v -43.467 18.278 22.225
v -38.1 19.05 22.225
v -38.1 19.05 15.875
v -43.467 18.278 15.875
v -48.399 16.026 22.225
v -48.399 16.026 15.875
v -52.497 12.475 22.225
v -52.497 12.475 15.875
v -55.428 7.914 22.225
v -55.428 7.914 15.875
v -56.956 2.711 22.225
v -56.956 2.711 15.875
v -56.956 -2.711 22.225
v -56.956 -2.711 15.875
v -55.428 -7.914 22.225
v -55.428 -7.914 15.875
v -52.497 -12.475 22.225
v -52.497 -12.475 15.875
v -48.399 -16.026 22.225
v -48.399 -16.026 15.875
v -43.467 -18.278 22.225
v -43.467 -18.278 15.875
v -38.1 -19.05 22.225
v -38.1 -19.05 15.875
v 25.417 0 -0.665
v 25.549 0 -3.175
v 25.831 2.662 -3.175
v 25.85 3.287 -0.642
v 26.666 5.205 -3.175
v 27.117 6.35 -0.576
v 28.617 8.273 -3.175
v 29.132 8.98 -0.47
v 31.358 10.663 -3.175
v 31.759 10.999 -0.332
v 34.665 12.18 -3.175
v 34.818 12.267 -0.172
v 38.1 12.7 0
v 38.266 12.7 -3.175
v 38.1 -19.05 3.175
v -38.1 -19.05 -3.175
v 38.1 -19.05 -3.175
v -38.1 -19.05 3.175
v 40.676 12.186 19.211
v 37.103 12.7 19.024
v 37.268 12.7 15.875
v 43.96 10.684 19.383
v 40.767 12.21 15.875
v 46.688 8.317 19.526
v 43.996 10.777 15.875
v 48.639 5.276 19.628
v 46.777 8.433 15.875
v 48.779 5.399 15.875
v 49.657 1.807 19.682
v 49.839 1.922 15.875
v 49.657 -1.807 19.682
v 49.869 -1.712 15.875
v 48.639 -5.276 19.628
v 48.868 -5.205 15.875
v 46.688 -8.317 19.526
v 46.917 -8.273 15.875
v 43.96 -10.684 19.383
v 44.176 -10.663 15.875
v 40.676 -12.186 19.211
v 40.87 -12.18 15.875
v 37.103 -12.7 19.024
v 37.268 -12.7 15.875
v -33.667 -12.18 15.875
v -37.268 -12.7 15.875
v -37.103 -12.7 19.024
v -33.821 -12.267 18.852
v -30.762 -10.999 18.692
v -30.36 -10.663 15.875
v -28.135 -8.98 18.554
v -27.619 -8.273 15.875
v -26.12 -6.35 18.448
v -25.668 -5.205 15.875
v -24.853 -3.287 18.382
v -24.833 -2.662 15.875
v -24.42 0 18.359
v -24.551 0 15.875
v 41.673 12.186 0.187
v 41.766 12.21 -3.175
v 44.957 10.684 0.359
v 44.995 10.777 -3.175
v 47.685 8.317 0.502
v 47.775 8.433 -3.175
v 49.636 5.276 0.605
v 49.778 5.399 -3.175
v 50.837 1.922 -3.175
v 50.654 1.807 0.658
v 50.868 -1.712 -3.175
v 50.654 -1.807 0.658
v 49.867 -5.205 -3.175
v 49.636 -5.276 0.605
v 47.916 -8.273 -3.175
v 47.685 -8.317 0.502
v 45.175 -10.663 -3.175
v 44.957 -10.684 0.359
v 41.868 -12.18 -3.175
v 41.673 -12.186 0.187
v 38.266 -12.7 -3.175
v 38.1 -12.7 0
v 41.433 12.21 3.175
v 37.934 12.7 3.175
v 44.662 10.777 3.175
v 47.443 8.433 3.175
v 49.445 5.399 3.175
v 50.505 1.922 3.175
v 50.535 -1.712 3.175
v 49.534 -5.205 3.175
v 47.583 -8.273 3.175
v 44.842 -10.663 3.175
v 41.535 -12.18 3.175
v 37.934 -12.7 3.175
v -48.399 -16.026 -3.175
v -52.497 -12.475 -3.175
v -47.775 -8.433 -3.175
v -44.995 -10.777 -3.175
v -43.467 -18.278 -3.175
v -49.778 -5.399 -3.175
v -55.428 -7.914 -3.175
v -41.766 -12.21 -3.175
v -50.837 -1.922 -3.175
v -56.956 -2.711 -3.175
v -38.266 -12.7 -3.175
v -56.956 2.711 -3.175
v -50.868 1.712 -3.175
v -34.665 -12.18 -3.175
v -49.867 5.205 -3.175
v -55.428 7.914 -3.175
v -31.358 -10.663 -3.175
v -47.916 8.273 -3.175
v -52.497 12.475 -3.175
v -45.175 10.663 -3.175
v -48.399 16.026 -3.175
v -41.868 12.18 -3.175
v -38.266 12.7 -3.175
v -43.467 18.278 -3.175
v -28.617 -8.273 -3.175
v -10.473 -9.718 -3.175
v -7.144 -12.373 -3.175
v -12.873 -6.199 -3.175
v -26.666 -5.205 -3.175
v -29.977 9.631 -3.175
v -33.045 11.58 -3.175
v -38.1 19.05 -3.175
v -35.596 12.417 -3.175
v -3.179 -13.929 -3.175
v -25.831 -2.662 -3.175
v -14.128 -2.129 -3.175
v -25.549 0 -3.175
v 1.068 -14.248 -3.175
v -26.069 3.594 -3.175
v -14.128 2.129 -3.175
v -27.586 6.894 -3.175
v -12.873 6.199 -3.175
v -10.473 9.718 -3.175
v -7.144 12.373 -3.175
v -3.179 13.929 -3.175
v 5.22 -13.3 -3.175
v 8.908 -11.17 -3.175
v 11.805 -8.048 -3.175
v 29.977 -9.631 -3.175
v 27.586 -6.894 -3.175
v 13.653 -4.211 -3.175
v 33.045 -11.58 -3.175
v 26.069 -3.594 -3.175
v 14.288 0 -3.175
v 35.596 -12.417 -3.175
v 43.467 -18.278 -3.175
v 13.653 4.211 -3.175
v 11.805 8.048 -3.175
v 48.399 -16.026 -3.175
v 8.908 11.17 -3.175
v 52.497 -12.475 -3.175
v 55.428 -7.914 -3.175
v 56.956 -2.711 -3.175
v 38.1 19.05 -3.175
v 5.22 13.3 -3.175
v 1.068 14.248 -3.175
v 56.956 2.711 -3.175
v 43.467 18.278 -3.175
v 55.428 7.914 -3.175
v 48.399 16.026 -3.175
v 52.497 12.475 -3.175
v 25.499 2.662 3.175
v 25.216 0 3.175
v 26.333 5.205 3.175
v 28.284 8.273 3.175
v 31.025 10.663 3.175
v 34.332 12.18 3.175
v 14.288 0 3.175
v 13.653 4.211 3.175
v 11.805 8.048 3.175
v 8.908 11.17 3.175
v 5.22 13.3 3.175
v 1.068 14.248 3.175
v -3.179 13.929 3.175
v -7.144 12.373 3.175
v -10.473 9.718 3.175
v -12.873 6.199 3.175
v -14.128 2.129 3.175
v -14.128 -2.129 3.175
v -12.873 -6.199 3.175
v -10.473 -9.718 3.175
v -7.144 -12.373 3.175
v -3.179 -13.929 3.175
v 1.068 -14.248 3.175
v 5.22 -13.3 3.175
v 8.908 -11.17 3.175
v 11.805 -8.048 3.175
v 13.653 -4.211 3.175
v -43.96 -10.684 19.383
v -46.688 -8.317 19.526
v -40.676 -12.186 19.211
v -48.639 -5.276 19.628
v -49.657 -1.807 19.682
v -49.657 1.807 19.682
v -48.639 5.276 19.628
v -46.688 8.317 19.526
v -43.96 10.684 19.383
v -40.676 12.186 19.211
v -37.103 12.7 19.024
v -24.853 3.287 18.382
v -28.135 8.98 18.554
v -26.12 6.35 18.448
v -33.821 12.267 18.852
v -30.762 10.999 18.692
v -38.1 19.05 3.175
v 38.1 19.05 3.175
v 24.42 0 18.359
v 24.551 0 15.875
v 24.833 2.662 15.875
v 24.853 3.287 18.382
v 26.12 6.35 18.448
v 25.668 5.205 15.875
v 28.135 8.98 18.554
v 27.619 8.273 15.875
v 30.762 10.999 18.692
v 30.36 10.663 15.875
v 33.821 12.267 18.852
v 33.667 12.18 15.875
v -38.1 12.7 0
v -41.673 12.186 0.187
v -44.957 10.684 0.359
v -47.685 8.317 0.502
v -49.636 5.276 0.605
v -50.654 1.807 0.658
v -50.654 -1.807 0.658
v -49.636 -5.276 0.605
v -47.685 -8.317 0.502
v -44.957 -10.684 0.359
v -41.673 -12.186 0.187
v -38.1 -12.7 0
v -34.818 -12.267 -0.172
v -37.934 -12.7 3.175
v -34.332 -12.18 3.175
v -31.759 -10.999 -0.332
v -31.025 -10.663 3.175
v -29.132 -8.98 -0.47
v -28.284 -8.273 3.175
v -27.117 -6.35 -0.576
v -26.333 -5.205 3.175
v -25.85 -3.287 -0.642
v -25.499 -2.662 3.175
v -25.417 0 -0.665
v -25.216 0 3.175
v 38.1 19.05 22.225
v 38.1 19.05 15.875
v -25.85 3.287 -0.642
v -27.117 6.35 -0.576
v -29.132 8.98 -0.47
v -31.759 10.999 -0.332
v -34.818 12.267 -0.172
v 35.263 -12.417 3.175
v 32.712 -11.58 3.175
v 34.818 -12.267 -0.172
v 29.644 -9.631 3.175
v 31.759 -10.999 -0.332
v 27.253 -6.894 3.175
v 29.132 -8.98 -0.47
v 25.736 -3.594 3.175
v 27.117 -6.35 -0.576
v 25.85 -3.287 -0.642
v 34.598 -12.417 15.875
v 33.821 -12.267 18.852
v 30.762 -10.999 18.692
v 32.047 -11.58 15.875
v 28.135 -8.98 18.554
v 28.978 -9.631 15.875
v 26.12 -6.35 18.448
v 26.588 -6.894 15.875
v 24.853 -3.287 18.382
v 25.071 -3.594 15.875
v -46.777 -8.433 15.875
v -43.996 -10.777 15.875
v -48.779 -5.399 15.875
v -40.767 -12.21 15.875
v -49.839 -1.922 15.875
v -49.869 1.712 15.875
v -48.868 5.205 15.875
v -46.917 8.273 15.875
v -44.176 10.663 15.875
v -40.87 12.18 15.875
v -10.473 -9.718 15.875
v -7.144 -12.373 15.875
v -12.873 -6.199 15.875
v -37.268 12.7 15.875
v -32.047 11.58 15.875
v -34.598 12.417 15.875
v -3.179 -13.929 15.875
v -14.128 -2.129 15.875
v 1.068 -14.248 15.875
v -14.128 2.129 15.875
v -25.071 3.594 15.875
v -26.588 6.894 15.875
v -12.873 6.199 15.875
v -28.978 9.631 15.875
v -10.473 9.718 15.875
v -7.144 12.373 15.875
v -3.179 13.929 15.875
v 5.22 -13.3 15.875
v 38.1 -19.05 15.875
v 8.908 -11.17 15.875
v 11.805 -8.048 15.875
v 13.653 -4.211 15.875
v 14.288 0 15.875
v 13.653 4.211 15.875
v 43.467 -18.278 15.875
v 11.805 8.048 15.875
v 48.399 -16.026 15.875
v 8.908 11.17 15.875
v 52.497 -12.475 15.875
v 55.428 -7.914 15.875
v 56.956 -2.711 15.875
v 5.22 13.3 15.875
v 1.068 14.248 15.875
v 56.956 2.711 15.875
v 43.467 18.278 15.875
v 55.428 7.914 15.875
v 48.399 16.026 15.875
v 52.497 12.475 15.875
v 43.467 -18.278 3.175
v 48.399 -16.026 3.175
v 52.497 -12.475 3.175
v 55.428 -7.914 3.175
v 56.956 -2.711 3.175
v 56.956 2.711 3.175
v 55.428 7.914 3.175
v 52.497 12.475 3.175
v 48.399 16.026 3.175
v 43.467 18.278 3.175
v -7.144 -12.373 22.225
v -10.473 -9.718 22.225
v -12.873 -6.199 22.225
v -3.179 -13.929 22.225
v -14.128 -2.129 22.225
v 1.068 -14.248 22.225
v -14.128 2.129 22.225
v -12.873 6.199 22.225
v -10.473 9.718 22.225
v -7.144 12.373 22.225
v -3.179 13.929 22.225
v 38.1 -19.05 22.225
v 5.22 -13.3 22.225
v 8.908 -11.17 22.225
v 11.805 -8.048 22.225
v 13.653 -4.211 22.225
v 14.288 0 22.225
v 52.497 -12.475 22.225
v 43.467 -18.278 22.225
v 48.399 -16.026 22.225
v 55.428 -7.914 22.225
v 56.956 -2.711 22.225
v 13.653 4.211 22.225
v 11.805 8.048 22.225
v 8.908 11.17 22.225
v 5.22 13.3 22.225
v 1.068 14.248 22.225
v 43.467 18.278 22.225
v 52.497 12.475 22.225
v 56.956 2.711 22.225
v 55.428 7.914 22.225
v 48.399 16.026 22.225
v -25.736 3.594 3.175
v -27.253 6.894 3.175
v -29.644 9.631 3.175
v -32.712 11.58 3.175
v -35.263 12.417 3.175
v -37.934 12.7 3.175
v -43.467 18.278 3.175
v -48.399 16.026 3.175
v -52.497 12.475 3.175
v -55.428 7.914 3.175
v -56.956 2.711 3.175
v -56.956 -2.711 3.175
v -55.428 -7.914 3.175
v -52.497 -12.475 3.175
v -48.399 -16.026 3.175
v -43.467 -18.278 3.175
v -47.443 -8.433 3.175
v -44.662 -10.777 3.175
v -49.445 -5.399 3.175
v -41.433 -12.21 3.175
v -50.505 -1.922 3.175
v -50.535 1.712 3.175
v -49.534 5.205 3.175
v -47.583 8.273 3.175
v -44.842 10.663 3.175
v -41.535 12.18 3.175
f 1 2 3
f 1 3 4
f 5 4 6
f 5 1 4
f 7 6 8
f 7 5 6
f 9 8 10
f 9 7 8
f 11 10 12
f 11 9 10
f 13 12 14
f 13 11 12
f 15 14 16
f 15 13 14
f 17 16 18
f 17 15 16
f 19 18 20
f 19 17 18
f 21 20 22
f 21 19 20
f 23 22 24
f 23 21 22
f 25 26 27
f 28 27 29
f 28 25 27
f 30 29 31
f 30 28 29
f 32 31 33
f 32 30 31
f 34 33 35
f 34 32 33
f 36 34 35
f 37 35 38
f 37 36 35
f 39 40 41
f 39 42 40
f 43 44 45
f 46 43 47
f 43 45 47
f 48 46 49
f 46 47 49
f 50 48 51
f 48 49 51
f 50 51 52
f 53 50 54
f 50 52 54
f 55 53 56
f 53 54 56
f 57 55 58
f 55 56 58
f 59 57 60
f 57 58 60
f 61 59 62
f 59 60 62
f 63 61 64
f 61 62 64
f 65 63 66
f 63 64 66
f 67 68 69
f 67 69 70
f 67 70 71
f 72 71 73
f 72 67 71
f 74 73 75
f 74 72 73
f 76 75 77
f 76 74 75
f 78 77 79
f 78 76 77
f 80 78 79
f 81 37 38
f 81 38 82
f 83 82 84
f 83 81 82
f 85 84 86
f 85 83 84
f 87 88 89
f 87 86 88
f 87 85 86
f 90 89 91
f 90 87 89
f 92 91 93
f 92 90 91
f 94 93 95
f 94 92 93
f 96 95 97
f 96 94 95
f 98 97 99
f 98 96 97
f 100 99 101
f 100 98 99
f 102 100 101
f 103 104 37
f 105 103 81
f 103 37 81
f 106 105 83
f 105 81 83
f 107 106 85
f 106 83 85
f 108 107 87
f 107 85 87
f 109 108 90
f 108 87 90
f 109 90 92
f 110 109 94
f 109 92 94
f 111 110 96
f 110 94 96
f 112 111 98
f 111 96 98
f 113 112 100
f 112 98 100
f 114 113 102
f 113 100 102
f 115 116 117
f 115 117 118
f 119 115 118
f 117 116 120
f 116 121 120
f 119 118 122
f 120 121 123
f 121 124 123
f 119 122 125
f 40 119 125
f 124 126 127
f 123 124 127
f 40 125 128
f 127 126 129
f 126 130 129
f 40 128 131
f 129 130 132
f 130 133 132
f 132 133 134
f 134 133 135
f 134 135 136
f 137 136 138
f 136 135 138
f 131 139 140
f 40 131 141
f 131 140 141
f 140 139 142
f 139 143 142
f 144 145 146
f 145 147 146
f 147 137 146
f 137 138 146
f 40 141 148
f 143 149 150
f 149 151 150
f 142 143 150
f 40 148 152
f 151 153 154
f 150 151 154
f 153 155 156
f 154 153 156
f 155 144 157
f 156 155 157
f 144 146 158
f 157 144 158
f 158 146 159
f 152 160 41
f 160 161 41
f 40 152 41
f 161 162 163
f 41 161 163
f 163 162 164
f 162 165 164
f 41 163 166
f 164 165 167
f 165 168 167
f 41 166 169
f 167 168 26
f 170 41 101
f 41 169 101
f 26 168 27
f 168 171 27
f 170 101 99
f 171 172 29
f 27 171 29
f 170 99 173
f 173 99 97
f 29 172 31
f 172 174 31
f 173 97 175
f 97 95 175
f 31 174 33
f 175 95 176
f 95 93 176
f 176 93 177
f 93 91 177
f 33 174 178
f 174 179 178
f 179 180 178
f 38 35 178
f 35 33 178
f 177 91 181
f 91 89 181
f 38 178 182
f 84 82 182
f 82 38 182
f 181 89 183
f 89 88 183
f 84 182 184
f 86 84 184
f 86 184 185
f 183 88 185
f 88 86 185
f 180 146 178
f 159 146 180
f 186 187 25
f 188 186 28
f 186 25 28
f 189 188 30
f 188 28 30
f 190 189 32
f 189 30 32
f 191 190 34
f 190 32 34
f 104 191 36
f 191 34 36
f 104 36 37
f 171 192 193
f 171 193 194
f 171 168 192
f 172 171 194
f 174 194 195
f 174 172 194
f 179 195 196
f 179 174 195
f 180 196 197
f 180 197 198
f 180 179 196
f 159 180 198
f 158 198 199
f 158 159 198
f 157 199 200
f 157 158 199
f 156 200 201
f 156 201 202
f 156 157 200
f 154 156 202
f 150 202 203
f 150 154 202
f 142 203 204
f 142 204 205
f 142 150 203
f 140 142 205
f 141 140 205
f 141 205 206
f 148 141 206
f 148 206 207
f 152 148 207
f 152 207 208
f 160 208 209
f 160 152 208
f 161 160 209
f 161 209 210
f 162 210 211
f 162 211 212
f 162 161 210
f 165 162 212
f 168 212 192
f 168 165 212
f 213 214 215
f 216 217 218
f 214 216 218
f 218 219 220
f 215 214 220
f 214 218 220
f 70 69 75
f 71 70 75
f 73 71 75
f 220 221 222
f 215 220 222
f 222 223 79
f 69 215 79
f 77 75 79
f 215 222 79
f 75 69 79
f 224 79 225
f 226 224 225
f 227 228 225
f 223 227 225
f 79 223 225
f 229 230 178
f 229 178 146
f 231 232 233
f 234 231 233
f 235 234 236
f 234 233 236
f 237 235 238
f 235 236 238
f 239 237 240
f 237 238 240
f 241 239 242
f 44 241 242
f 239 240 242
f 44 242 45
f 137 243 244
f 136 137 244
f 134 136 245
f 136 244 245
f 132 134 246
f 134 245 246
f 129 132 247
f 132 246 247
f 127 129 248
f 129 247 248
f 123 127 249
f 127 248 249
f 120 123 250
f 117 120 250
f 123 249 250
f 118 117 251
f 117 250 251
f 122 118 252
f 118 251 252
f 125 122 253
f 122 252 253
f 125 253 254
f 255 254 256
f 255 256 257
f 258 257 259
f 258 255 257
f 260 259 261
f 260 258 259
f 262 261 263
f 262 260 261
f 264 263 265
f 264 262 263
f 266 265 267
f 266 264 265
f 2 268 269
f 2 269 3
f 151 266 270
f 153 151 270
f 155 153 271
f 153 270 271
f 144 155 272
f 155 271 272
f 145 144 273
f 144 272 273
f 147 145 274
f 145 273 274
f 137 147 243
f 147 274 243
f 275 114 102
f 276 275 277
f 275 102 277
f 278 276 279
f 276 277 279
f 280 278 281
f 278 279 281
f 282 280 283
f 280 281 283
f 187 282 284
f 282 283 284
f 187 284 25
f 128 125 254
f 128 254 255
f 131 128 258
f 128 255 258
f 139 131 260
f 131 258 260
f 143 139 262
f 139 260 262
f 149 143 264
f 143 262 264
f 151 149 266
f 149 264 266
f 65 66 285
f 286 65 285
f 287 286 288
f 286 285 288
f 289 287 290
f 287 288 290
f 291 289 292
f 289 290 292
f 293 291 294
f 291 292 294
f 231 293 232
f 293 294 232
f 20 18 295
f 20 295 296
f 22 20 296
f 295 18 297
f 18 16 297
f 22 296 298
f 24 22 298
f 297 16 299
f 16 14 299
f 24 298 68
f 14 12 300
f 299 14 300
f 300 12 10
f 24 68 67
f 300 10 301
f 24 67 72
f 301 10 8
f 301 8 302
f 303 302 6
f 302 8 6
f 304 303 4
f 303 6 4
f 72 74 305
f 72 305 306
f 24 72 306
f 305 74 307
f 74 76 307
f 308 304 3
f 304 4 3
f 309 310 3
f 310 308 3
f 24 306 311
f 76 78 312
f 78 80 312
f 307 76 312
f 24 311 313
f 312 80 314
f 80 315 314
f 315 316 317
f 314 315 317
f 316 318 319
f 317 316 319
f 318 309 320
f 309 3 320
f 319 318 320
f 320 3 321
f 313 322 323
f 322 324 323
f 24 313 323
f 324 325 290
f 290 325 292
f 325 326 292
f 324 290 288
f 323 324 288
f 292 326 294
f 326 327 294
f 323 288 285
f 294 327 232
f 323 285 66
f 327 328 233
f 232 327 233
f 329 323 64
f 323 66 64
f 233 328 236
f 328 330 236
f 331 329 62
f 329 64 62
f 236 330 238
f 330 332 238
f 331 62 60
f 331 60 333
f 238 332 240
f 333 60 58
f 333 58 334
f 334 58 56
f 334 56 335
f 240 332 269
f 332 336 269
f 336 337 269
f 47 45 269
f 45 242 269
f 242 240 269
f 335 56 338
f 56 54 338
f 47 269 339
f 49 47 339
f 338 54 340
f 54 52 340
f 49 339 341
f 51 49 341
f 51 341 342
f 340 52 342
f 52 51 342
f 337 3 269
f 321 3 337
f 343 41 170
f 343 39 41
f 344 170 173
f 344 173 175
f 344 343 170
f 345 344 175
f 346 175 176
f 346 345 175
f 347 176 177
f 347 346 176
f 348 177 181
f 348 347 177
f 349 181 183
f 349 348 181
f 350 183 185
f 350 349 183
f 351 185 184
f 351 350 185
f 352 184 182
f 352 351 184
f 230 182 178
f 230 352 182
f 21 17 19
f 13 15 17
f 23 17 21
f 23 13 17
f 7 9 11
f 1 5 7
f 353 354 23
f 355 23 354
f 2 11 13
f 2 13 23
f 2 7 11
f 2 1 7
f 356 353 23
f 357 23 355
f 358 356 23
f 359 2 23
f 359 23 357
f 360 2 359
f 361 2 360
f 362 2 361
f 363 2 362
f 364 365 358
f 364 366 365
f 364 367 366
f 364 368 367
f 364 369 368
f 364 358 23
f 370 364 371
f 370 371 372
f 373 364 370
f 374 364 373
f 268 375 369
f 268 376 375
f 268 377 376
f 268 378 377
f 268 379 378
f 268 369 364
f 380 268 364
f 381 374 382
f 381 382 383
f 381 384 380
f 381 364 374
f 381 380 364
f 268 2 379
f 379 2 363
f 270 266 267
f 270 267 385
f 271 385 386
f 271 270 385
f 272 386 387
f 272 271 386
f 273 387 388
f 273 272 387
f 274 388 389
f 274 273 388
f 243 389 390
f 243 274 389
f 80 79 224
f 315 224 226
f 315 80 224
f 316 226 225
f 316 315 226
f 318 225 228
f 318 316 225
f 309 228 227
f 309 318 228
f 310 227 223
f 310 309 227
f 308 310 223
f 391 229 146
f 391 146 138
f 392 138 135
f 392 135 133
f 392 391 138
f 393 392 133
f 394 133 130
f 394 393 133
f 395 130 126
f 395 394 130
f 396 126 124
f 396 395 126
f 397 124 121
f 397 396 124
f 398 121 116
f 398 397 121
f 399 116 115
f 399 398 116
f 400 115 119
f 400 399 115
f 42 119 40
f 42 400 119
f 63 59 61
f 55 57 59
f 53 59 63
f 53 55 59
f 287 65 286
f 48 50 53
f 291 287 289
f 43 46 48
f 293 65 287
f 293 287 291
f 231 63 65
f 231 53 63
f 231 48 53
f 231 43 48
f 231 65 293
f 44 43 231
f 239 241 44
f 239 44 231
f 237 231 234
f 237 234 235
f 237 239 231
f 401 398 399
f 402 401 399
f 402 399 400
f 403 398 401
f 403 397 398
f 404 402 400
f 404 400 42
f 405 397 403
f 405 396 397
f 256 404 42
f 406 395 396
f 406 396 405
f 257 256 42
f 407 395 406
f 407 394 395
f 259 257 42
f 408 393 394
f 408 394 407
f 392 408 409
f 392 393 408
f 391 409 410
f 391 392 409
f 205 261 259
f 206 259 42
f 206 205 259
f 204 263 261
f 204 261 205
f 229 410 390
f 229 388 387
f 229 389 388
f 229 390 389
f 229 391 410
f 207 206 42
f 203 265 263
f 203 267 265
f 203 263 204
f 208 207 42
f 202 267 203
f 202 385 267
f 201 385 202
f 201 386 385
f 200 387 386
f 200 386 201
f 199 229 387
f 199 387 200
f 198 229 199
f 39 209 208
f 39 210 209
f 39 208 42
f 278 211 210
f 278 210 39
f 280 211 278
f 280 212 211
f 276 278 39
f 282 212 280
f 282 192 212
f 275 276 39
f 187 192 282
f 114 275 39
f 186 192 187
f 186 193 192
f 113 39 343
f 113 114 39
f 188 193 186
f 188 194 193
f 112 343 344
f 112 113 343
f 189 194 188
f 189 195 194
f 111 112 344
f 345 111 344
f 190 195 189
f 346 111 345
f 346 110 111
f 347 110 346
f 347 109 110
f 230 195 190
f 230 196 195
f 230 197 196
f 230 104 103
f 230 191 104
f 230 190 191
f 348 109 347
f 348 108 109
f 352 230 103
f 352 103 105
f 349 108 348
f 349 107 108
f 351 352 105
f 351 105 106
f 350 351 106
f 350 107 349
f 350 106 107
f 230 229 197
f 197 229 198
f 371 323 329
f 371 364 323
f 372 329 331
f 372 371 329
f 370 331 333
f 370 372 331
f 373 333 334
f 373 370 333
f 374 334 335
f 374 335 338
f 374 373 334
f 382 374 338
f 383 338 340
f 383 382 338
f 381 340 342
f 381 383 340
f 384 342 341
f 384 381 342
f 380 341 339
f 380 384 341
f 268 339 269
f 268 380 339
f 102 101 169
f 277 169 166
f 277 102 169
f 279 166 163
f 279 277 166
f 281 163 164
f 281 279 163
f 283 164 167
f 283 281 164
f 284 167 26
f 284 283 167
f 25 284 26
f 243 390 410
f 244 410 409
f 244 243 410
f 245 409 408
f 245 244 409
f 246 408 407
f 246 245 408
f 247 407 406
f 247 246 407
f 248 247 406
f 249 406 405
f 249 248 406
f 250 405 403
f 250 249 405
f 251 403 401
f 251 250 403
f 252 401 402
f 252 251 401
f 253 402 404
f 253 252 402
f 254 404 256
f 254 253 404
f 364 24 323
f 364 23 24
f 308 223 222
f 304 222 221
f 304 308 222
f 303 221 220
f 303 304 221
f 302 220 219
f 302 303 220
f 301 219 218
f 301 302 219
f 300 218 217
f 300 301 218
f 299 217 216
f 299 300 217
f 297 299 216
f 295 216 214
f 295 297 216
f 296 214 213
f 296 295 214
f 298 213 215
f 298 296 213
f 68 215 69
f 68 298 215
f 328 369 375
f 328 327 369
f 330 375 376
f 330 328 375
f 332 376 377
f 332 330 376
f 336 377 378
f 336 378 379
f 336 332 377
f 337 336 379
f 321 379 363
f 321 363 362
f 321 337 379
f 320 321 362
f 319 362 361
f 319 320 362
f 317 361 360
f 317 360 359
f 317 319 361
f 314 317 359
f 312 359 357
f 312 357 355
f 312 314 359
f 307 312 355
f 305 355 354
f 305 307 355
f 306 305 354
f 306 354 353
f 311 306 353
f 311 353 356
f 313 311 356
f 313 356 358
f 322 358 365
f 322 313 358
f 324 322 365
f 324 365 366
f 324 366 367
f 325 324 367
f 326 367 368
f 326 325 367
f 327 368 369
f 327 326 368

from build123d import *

# Parameters (mm, degrees)
F0_R     = 14.2875
F1_DEPTH = 3.175
F2_R     = 14.2875
F3_DEPTH = 3.175
F7_DEPTH = 19.05
F8_ANGLE = 3


# Not quite as in the source:
# - a feature names something its author has since deleted; it is built from what else it names


with BuildPart() as f1:
    # F0 (on Top) → F1 (new body, symmetric)
    with BuildSketch(Plane.XY):
        with BuildLine():
            ThreePointArc((38.1, -19.05), (57.15, 3e-10), (38.0999999995, 19.05))
            Line((38.0999999995, 19.05), (-38.1, 19.05))
            ThreePointArc((-38.1, 19.05), (-57.1499999995, -3e-10), (-38.0999999995, -19.05))
            Line((-38.0999999995, -19.05), (38.1, -19.05))
        make_face()
        Circle(F0_R, mode=Mode.SUBTRACT)
    extrude(amount=F1_DEPTH, both=True)


with BuildPart() as f3:
    # F2 (on Top) → F3 (new body, symmetric)
    with BuildSketch(Plane.XY):
        with BuildLine():
            ThreePointArc((38.1, -19.05), (57.15, 0), (38.1, 19.05))
            Line((38.1, 19.05), (-38.1, 19.05))
            Line((-38.1, 19.05), (-38.1, -19.05))
            Line((-38.1, -19.05), (38.1, -19.05))
        make_face()
        Circle(F2_R, mode=Mode.SUBTRACT)
        with BuildLine():
            Line((-38.1, -19.05), (-38.1, 19.05))
            ThreePointArc((-38.1, 19.05), (-57.15, 0), (-38.1, -19.05))
        make_face()
    extrude(amount=F3_DEPTH, both=True)


with BuildPart() as f1_1:
    # F5: moved
    add(f1.part.moved(Location((0, 0, 19.05))))


with BuildPart() as f7:
    # F6 (on Top) → F7 (new body, symmetric)
    with BuildSketch(Plane.XY):
        with BuildLine():
            Line((-38.1, -12.7), (-38.1, 12.7))
            ThreePointArc((-38.1, 12.7), (-50.8, 0), (-38.1, -12.7))
        make_face()
        with BuildLine():
            ThreePointArc((-38.1, -12.7), (-29.1197438789, -8.9802561211), (-25.4, 0))
            ThreePointArc((-25.4, 0), (-29.1197438789, 8.9802561211), (-38.1, 12.7))
            Line((-38.1, 12.7), (-38.1, -12.7))
        make_face()
    extrude(amount=F7_DEPTH, both=True)


with BuildPart() as f7_1:
    # F8: moved
    add(f7.part.rotate(Axis((-38.1, 0, 0), (0, 1, 0)), F8_ANGLE))


with BuildPart() as f9_1:
    # F9: instance of F7
    add(f7_1.part.mirror(Plane.YZ))


with BuildPart() as f1_2:
    add(f1_1.part)

    # F10: cut F7, F9_1
    add(f7_1.part, mode=Mode.SUBTRACT)
    add(f9_1.part, mode=Mode.SUBTRACT)


with BuildPart() as f3_1:
    add(f3.part)

    # F10: cut F7, F9_1
    add(f7_1.part, mode=Mode.SUBTRACT)
    add(f9_1.part, mode=Mode.SUBTRACT)


solid = Compound([f1_2.part, f3_1.part])
